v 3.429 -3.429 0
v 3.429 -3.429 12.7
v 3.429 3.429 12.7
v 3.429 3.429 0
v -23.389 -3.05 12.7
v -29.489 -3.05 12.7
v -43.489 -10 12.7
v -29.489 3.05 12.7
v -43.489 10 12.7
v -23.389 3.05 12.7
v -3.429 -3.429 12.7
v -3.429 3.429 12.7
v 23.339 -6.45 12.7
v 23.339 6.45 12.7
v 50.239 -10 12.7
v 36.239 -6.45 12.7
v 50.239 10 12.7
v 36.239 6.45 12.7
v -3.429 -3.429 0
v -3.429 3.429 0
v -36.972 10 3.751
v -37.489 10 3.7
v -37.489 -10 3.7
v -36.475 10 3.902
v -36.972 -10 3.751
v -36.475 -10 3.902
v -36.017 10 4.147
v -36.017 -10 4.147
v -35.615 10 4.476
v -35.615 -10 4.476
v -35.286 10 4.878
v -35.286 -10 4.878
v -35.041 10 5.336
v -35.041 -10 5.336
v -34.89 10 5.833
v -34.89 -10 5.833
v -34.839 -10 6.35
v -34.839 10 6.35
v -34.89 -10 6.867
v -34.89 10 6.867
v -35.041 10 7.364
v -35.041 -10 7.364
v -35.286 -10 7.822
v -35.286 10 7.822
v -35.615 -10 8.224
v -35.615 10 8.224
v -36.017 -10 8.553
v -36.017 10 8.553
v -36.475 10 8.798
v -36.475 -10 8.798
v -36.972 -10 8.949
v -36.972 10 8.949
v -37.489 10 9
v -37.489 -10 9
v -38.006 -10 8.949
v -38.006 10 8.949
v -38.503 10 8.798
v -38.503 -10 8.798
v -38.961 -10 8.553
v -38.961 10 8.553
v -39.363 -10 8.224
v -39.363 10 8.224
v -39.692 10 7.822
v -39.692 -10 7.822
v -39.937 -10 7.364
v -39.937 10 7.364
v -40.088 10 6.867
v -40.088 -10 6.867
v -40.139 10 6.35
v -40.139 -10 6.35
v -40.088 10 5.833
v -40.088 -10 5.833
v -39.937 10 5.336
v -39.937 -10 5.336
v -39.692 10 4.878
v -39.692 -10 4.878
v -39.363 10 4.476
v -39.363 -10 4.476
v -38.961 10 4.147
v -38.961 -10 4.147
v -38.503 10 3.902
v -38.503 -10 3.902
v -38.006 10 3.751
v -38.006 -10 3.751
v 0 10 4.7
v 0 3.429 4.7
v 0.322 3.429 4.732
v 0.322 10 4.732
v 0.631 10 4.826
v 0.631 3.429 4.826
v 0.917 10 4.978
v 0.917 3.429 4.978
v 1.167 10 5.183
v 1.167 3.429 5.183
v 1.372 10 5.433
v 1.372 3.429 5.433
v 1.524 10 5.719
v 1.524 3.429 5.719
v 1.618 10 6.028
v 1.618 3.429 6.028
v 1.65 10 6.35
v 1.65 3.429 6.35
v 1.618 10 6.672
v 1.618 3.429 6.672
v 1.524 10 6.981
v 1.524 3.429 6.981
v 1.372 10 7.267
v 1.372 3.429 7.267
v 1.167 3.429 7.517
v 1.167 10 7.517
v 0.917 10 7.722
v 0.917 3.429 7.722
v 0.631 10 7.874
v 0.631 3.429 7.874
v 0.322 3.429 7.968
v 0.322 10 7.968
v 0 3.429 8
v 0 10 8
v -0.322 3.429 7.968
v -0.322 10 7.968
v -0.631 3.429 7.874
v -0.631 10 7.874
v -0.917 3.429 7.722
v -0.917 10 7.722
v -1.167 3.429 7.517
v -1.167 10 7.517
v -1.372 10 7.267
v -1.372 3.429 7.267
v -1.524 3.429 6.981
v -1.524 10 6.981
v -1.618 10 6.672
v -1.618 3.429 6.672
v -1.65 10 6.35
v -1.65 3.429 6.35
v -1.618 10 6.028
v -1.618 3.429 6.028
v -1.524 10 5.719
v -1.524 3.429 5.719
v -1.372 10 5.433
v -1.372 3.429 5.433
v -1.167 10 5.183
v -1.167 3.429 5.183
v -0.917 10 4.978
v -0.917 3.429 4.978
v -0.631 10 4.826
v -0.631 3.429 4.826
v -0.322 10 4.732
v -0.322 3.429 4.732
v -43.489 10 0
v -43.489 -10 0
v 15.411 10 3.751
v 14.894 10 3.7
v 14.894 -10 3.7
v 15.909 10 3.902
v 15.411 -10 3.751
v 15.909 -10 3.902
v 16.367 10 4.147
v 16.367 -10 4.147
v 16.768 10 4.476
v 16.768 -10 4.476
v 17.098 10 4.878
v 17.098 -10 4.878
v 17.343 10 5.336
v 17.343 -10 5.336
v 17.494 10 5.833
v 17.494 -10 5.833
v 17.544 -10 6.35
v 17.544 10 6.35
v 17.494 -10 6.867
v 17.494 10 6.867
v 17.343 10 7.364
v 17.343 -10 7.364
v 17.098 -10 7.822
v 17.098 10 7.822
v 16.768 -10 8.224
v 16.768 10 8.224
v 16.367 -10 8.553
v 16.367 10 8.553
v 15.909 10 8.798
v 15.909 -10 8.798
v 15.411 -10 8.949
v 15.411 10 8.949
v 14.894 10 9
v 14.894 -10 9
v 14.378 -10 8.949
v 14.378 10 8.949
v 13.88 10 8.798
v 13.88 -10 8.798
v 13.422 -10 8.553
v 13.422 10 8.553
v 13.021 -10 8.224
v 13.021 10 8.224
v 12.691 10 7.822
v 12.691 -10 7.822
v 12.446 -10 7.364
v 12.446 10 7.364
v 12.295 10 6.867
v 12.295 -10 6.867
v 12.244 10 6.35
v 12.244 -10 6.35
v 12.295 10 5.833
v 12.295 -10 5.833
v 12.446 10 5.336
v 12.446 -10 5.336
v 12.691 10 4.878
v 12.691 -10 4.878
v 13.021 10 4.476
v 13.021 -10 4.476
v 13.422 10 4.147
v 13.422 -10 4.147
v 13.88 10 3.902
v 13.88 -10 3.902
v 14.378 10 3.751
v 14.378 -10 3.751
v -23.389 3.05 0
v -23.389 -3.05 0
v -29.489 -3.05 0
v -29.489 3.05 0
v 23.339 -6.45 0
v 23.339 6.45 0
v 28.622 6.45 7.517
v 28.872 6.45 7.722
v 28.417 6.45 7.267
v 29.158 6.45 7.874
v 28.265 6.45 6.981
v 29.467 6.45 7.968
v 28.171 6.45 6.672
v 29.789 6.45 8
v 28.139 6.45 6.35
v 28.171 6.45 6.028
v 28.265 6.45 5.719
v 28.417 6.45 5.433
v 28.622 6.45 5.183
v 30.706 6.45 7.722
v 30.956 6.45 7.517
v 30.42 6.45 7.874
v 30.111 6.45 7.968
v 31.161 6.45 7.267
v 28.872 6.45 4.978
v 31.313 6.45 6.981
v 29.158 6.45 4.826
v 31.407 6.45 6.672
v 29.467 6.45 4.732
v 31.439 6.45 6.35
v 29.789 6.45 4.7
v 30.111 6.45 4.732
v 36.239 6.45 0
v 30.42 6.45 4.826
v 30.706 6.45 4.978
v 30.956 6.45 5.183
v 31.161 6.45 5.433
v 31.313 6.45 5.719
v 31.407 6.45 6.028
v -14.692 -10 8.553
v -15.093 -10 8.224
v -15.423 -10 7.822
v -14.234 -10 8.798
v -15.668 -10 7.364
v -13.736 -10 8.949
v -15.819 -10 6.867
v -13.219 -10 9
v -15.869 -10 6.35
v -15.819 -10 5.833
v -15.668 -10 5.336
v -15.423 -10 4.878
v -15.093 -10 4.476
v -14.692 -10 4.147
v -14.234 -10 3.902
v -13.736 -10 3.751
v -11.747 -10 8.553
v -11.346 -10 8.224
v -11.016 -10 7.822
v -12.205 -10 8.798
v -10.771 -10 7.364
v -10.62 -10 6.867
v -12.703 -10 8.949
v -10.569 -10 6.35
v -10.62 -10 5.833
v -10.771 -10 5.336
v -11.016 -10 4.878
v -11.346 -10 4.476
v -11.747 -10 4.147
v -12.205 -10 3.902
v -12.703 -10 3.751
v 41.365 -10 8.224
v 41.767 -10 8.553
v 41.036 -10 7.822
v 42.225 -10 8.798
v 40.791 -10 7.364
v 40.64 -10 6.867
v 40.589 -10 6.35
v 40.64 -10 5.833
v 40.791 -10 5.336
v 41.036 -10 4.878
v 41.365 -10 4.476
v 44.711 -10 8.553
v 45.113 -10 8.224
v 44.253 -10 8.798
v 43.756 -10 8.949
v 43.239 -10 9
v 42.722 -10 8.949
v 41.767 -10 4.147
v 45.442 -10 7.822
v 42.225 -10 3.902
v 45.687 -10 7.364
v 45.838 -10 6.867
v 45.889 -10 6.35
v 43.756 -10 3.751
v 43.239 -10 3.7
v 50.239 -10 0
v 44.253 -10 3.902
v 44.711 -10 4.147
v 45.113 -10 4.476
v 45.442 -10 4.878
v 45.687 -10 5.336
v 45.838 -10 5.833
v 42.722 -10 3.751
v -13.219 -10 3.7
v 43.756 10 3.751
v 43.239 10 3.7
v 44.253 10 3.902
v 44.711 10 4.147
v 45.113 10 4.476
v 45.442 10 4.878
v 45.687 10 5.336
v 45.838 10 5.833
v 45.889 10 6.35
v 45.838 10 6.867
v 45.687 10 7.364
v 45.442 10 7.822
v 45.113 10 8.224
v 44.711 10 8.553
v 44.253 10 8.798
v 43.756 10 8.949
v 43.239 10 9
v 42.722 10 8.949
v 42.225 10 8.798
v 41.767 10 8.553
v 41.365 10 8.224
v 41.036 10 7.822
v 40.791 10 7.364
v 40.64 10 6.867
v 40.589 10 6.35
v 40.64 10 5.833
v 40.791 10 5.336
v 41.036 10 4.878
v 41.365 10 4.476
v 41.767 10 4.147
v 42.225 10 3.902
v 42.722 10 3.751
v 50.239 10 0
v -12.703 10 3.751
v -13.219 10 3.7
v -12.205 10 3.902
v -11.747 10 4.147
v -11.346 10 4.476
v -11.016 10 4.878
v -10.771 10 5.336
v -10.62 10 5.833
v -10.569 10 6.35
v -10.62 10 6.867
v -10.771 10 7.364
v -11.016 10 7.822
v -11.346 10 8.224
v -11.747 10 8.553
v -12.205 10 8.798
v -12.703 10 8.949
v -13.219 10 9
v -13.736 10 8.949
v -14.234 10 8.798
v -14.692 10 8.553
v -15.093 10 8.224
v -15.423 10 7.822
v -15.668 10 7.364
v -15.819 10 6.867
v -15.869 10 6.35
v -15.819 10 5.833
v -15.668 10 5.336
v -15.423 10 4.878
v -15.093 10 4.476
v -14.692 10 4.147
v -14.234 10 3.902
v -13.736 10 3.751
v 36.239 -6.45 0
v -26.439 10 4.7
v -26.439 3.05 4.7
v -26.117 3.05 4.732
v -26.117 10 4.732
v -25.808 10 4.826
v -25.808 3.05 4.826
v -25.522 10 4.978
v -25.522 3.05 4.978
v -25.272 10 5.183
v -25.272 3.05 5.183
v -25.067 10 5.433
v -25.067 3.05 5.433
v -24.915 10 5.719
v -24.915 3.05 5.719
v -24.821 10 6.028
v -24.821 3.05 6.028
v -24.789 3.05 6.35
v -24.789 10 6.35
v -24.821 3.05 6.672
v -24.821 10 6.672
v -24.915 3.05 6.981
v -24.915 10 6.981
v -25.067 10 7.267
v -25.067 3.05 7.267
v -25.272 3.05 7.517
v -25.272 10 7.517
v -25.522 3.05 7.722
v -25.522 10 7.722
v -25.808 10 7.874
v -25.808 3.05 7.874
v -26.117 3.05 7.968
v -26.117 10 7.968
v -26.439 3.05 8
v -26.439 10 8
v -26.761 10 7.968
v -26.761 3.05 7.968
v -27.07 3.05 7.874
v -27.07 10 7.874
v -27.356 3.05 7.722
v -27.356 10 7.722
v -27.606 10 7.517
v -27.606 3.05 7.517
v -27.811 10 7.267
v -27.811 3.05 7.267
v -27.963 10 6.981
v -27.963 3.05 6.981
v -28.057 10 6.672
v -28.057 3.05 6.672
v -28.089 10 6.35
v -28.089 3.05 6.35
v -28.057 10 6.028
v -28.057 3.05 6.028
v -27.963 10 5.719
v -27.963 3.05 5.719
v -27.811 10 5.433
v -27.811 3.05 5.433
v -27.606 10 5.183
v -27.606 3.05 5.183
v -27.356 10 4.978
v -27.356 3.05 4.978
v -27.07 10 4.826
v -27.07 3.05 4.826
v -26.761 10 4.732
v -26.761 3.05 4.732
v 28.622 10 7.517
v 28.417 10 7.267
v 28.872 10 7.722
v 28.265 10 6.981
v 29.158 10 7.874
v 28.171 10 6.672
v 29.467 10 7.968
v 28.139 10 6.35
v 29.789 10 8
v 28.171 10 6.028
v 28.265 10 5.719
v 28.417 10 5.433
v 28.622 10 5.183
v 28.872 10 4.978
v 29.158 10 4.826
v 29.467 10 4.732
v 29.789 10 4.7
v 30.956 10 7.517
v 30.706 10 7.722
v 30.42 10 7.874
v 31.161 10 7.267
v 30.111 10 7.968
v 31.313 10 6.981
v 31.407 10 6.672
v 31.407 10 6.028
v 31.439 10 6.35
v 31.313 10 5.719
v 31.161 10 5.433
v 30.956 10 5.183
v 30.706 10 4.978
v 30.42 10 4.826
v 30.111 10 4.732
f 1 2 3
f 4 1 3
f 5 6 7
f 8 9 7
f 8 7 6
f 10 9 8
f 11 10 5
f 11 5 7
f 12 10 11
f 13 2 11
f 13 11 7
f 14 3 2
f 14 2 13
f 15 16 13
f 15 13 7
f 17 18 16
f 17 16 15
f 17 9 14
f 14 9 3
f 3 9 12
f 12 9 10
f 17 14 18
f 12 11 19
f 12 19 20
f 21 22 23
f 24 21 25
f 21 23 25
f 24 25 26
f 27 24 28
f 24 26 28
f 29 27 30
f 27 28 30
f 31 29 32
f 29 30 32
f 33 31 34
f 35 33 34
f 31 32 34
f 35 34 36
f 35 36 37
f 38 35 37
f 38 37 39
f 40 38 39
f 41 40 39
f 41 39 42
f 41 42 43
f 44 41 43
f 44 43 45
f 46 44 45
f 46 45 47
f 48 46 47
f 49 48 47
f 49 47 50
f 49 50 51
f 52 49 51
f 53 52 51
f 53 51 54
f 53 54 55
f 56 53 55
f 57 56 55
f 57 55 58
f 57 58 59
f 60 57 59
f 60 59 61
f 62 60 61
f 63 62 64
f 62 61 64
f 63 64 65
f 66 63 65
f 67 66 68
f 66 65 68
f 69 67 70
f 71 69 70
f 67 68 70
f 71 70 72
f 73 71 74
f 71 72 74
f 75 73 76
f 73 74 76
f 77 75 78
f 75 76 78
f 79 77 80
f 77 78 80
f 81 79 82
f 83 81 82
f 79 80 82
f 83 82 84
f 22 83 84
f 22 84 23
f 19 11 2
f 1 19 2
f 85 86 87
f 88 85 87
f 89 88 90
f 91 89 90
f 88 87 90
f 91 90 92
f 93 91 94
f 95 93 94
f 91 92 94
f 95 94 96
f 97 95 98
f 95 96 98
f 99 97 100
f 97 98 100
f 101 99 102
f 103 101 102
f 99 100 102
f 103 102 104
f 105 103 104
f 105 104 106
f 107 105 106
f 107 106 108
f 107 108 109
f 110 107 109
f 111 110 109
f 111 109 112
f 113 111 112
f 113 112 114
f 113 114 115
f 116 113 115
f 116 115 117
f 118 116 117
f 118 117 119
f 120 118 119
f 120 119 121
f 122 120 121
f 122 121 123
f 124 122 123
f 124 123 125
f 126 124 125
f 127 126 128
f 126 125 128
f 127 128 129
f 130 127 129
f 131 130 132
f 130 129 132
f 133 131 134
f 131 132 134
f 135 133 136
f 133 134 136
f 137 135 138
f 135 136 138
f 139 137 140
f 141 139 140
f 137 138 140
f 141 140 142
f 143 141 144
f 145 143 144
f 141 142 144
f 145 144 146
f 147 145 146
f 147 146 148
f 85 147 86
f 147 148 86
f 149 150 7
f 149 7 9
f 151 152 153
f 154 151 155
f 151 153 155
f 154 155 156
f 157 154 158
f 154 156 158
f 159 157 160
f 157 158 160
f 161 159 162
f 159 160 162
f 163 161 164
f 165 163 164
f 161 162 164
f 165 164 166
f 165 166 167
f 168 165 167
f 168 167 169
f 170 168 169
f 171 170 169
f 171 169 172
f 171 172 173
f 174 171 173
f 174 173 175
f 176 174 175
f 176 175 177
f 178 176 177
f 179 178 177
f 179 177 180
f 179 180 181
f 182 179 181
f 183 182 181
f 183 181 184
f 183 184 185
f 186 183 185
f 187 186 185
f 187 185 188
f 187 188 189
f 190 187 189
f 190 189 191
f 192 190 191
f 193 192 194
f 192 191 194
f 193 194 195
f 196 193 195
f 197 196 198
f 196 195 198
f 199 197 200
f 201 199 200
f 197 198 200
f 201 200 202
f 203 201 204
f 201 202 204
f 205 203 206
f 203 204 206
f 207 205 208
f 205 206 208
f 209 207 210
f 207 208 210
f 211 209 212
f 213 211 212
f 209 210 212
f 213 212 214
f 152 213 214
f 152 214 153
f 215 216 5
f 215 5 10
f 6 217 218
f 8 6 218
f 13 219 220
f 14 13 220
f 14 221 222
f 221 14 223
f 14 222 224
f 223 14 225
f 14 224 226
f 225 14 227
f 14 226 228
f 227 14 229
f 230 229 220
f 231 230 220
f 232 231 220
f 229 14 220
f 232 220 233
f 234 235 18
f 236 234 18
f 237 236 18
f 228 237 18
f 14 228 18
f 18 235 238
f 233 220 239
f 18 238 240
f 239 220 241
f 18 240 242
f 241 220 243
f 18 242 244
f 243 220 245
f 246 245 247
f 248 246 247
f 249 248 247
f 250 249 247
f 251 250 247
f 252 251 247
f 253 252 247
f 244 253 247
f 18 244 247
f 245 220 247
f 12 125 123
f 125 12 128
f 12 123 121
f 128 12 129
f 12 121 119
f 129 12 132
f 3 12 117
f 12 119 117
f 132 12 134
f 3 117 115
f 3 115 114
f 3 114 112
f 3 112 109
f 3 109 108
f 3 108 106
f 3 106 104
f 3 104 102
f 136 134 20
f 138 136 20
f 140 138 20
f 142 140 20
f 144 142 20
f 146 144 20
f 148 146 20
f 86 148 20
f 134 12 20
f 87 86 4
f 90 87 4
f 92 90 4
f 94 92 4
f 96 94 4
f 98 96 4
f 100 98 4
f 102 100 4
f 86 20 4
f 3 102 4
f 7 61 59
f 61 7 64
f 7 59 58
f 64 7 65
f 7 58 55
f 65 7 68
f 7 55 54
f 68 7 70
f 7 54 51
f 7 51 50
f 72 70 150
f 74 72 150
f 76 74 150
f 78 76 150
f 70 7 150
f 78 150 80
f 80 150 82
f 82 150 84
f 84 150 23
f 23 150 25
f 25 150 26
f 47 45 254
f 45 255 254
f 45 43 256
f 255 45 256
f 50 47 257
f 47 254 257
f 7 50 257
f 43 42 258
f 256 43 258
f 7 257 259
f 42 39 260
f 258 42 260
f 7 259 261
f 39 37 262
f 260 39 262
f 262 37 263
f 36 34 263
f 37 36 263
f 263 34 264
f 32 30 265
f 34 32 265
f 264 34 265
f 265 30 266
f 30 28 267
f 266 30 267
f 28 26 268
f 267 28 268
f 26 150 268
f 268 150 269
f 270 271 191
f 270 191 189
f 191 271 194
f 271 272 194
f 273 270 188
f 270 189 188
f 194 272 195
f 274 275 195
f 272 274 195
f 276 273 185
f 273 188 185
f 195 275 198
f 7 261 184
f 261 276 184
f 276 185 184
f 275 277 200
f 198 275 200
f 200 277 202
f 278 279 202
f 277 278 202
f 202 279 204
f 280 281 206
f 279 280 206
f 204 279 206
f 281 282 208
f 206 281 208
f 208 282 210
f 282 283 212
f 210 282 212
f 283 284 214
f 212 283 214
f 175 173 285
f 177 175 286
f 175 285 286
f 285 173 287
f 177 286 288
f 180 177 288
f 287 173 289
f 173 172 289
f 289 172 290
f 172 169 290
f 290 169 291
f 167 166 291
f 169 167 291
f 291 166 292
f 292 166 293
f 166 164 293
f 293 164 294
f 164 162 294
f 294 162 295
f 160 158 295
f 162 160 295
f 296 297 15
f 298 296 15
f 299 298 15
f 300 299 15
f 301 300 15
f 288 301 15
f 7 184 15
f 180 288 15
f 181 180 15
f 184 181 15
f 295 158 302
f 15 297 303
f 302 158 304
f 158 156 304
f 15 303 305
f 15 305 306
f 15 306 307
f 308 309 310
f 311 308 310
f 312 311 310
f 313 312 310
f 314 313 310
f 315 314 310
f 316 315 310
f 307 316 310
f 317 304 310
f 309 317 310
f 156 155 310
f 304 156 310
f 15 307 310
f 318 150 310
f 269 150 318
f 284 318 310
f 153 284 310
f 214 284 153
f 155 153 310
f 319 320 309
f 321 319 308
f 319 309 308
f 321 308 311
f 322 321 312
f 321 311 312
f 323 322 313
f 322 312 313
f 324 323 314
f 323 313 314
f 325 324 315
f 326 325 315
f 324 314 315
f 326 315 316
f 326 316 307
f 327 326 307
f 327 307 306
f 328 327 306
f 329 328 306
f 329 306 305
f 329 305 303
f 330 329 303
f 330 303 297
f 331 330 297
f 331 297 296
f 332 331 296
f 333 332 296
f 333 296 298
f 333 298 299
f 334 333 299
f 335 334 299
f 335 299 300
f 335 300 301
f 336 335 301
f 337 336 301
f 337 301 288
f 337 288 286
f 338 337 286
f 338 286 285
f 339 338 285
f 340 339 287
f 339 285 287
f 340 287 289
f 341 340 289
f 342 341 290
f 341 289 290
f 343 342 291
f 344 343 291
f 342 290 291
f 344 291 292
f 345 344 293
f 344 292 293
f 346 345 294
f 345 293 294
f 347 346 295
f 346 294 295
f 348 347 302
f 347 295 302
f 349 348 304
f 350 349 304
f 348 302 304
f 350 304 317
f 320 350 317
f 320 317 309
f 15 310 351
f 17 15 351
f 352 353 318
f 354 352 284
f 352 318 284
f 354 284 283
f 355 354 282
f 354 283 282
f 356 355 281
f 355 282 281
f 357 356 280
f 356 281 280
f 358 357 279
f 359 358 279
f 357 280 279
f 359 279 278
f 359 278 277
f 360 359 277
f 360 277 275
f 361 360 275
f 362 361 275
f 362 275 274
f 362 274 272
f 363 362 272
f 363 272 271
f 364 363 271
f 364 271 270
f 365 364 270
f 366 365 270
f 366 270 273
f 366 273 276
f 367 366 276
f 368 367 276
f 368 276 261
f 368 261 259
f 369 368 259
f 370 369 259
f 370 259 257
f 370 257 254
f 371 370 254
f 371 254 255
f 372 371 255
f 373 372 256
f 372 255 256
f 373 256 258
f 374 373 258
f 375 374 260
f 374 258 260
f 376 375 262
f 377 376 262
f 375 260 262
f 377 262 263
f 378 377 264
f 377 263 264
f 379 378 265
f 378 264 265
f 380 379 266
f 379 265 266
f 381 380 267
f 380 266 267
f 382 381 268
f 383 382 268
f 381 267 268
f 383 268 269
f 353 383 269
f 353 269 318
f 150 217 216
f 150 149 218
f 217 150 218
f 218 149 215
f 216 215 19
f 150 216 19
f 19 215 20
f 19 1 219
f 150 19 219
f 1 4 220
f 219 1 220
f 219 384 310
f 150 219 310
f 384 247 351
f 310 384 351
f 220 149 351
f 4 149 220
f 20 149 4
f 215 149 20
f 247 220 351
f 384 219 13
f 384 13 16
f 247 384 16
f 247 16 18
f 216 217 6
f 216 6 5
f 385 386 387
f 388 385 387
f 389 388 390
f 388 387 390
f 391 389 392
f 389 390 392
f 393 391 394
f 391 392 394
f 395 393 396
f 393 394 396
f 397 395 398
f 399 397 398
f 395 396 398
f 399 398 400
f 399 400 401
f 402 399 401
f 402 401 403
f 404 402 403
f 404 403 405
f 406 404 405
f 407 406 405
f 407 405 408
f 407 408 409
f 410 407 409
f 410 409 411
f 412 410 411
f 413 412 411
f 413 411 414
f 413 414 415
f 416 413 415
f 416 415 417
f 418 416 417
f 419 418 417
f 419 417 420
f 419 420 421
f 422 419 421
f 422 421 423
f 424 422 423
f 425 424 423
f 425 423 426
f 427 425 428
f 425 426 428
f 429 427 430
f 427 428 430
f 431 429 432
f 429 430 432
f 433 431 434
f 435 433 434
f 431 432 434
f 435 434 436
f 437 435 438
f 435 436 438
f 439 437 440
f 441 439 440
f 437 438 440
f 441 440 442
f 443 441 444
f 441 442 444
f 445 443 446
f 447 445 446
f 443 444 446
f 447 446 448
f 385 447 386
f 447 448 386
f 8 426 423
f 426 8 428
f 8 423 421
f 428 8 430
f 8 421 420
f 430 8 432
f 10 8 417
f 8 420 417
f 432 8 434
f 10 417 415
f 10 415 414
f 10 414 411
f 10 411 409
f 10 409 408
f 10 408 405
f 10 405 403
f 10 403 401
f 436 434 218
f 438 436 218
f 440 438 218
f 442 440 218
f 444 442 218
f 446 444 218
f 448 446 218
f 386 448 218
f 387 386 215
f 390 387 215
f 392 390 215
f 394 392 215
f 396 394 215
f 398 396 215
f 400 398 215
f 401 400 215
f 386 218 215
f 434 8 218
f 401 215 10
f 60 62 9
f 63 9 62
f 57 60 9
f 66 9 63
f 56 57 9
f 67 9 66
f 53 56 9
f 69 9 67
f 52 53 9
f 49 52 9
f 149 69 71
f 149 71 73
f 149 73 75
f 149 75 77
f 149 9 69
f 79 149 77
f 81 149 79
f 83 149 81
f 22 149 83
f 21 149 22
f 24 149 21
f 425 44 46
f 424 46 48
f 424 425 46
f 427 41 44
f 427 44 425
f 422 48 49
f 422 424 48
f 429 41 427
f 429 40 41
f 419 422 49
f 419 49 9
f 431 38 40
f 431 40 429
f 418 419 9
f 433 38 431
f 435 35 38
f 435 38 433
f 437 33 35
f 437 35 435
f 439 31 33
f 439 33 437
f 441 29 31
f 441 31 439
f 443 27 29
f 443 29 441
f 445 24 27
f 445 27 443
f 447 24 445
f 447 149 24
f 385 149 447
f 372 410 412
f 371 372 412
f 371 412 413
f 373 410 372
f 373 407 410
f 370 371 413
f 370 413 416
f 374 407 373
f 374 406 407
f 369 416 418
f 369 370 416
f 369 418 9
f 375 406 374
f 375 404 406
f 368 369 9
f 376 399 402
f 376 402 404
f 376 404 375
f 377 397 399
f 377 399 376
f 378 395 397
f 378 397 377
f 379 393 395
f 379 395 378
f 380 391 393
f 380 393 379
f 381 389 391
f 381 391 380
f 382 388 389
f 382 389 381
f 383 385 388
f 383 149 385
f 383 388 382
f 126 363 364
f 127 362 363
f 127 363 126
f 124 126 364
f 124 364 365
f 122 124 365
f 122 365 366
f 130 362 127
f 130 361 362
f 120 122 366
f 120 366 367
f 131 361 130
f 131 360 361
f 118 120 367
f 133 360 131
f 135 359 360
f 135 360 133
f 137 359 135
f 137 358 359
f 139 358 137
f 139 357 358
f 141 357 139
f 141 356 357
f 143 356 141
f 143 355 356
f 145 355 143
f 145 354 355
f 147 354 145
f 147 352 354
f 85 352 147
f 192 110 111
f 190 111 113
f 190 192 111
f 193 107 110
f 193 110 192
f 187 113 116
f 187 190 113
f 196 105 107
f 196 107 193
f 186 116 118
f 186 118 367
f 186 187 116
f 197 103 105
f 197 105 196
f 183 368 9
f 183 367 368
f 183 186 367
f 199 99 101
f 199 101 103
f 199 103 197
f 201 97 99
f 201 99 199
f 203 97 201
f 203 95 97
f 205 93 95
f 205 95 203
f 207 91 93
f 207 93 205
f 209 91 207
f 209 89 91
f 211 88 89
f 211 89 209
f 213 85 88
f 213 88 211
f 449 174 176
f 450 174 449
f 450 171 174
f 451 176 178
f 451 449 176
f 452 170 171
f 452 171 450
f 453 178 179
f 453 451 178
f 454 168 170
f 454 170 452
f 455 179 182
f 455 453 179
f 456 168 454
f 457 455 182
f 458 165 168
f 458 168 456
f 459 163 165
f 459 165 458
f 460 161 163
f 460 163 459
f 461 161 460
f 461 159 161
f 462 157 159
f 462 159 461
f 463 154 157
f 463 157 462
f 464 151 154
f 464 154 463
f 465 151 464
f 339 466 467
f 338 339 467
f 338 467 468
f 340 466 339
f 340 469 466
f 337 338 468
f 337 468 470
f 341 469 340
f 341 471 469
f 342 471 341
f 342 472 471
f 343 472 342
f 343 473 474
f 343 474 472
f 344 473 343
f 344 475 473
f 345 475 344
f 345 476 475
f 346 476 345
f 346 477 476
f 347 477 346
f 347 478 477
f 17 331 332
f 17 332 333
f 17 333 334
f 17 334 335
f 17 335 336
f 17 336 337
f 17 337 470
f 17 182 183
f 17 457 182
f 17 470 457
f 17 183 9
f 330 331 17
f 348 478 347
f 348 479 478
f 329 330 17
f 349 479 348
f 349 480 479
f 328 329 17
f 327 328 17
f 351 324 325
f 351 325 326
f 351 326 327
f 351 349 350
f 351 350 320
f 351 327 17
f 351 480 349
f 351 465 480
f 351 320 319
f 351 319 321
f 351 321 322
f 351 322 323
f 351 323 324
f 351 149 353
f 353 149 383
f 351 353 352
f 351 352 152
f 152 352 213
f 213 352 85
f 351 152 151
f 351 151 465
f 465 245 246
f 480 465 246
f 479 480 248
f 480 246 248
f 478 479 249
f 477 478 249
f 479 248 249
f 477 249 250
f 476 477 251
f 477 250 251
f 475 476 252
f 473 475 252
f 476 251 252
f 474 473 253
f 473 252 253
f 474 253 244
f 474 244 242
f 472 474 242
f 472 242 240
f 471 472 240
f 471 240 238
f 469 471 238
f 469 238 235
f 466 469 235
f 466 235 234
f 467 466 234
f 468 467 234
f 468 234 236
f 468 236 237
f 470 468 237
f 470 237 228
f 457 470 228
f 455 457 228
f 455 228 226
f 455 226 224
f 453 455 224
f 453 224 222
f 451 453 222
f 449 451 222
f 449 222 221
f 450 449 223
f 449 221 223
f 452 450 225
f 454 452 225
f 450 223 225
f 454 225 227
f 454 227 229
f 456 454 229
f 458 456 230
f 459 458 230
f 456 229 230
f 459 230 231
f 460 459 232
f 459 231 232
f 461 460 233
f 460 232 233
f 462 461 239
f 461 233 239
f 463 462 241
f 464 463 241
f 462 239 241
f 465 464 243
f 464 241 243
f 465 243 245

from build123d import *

# Parameters (mm, degrees)
SKETCH1_W                       = 93.728
SKETCH1_H                       = 20
SKETCH1_W_2                     = 6.1
SKETCH1_H_2                     = 6.1
SKETCH1_W_3                     = 6.858
SKETCH1_H_3                     = 6.858
SKETCH1_W_4                     = 12.9
SKETCH1_H_4                     = 12.9
BOSS_EXTRUDE1_DEPTH             = 12.7
TAP_DRILL_FOR_M4X0_7_TAP1_D     = 3.3
TAP_DRILL_FOR_M4X0_7_TAP1_DEPTH = 6.95
M5_CLEARANCE_HOLE1_D            = 5.3


with BuildPart() as part:
    # Sketch1 → Boss-Extrude1 (new body)
    with BuildSketch(Plane.XY):
        with Locations((3.375, 0)):
            Rectangle(SKETCH1_W, SKETCH1_H)
        with Locations((-26.439, 0)):
            Rectangle(SKETCH1_W_2, SKETCH1_H_2, mode=Mode.SUBTRACT)
        Rectangle(SKETCH1_W_3, SKETCH1_H_3, mode=Mode.SUBTRACT)
        with Locations((29.789, 0)):
            Rectangle(SKETCH1_W_4, SKETCH1_H_4, mode=Mode.SUBTRACT)
    extrude(amount=BOSS_EXTRUDE1_DEPTH)

    # Tap Drill for M4x0.7 Tap1
    with Locations(Plane(origin=(-26.439, 10, 6.35), x_dir=(0, 0, 1), z_dir=(0, 1, 0))):
        with Locations((0, 0), (0, 26.439), (0, 56.228)):
            Hole(TAP_DRILL_FOR_M4X0_7_TAP1_D / 2, depth=TAP_DRILL_FOR_M4X0_7_TAP1_DEPTH)

    # M5 Clearance Hole1 (through all)
    with Locations(Plane(origin=(-37.489, 10, 6.35), x_dir=(0, 0, 1), z_dir=(0, 1, 0))):
        with Locations((0, 0), (0, 24.2695), (0, 52.3835), (0, 80.728)):
            Hole(M5_CLEARANCE_HOLE1_D / 2)


solid = part.part
